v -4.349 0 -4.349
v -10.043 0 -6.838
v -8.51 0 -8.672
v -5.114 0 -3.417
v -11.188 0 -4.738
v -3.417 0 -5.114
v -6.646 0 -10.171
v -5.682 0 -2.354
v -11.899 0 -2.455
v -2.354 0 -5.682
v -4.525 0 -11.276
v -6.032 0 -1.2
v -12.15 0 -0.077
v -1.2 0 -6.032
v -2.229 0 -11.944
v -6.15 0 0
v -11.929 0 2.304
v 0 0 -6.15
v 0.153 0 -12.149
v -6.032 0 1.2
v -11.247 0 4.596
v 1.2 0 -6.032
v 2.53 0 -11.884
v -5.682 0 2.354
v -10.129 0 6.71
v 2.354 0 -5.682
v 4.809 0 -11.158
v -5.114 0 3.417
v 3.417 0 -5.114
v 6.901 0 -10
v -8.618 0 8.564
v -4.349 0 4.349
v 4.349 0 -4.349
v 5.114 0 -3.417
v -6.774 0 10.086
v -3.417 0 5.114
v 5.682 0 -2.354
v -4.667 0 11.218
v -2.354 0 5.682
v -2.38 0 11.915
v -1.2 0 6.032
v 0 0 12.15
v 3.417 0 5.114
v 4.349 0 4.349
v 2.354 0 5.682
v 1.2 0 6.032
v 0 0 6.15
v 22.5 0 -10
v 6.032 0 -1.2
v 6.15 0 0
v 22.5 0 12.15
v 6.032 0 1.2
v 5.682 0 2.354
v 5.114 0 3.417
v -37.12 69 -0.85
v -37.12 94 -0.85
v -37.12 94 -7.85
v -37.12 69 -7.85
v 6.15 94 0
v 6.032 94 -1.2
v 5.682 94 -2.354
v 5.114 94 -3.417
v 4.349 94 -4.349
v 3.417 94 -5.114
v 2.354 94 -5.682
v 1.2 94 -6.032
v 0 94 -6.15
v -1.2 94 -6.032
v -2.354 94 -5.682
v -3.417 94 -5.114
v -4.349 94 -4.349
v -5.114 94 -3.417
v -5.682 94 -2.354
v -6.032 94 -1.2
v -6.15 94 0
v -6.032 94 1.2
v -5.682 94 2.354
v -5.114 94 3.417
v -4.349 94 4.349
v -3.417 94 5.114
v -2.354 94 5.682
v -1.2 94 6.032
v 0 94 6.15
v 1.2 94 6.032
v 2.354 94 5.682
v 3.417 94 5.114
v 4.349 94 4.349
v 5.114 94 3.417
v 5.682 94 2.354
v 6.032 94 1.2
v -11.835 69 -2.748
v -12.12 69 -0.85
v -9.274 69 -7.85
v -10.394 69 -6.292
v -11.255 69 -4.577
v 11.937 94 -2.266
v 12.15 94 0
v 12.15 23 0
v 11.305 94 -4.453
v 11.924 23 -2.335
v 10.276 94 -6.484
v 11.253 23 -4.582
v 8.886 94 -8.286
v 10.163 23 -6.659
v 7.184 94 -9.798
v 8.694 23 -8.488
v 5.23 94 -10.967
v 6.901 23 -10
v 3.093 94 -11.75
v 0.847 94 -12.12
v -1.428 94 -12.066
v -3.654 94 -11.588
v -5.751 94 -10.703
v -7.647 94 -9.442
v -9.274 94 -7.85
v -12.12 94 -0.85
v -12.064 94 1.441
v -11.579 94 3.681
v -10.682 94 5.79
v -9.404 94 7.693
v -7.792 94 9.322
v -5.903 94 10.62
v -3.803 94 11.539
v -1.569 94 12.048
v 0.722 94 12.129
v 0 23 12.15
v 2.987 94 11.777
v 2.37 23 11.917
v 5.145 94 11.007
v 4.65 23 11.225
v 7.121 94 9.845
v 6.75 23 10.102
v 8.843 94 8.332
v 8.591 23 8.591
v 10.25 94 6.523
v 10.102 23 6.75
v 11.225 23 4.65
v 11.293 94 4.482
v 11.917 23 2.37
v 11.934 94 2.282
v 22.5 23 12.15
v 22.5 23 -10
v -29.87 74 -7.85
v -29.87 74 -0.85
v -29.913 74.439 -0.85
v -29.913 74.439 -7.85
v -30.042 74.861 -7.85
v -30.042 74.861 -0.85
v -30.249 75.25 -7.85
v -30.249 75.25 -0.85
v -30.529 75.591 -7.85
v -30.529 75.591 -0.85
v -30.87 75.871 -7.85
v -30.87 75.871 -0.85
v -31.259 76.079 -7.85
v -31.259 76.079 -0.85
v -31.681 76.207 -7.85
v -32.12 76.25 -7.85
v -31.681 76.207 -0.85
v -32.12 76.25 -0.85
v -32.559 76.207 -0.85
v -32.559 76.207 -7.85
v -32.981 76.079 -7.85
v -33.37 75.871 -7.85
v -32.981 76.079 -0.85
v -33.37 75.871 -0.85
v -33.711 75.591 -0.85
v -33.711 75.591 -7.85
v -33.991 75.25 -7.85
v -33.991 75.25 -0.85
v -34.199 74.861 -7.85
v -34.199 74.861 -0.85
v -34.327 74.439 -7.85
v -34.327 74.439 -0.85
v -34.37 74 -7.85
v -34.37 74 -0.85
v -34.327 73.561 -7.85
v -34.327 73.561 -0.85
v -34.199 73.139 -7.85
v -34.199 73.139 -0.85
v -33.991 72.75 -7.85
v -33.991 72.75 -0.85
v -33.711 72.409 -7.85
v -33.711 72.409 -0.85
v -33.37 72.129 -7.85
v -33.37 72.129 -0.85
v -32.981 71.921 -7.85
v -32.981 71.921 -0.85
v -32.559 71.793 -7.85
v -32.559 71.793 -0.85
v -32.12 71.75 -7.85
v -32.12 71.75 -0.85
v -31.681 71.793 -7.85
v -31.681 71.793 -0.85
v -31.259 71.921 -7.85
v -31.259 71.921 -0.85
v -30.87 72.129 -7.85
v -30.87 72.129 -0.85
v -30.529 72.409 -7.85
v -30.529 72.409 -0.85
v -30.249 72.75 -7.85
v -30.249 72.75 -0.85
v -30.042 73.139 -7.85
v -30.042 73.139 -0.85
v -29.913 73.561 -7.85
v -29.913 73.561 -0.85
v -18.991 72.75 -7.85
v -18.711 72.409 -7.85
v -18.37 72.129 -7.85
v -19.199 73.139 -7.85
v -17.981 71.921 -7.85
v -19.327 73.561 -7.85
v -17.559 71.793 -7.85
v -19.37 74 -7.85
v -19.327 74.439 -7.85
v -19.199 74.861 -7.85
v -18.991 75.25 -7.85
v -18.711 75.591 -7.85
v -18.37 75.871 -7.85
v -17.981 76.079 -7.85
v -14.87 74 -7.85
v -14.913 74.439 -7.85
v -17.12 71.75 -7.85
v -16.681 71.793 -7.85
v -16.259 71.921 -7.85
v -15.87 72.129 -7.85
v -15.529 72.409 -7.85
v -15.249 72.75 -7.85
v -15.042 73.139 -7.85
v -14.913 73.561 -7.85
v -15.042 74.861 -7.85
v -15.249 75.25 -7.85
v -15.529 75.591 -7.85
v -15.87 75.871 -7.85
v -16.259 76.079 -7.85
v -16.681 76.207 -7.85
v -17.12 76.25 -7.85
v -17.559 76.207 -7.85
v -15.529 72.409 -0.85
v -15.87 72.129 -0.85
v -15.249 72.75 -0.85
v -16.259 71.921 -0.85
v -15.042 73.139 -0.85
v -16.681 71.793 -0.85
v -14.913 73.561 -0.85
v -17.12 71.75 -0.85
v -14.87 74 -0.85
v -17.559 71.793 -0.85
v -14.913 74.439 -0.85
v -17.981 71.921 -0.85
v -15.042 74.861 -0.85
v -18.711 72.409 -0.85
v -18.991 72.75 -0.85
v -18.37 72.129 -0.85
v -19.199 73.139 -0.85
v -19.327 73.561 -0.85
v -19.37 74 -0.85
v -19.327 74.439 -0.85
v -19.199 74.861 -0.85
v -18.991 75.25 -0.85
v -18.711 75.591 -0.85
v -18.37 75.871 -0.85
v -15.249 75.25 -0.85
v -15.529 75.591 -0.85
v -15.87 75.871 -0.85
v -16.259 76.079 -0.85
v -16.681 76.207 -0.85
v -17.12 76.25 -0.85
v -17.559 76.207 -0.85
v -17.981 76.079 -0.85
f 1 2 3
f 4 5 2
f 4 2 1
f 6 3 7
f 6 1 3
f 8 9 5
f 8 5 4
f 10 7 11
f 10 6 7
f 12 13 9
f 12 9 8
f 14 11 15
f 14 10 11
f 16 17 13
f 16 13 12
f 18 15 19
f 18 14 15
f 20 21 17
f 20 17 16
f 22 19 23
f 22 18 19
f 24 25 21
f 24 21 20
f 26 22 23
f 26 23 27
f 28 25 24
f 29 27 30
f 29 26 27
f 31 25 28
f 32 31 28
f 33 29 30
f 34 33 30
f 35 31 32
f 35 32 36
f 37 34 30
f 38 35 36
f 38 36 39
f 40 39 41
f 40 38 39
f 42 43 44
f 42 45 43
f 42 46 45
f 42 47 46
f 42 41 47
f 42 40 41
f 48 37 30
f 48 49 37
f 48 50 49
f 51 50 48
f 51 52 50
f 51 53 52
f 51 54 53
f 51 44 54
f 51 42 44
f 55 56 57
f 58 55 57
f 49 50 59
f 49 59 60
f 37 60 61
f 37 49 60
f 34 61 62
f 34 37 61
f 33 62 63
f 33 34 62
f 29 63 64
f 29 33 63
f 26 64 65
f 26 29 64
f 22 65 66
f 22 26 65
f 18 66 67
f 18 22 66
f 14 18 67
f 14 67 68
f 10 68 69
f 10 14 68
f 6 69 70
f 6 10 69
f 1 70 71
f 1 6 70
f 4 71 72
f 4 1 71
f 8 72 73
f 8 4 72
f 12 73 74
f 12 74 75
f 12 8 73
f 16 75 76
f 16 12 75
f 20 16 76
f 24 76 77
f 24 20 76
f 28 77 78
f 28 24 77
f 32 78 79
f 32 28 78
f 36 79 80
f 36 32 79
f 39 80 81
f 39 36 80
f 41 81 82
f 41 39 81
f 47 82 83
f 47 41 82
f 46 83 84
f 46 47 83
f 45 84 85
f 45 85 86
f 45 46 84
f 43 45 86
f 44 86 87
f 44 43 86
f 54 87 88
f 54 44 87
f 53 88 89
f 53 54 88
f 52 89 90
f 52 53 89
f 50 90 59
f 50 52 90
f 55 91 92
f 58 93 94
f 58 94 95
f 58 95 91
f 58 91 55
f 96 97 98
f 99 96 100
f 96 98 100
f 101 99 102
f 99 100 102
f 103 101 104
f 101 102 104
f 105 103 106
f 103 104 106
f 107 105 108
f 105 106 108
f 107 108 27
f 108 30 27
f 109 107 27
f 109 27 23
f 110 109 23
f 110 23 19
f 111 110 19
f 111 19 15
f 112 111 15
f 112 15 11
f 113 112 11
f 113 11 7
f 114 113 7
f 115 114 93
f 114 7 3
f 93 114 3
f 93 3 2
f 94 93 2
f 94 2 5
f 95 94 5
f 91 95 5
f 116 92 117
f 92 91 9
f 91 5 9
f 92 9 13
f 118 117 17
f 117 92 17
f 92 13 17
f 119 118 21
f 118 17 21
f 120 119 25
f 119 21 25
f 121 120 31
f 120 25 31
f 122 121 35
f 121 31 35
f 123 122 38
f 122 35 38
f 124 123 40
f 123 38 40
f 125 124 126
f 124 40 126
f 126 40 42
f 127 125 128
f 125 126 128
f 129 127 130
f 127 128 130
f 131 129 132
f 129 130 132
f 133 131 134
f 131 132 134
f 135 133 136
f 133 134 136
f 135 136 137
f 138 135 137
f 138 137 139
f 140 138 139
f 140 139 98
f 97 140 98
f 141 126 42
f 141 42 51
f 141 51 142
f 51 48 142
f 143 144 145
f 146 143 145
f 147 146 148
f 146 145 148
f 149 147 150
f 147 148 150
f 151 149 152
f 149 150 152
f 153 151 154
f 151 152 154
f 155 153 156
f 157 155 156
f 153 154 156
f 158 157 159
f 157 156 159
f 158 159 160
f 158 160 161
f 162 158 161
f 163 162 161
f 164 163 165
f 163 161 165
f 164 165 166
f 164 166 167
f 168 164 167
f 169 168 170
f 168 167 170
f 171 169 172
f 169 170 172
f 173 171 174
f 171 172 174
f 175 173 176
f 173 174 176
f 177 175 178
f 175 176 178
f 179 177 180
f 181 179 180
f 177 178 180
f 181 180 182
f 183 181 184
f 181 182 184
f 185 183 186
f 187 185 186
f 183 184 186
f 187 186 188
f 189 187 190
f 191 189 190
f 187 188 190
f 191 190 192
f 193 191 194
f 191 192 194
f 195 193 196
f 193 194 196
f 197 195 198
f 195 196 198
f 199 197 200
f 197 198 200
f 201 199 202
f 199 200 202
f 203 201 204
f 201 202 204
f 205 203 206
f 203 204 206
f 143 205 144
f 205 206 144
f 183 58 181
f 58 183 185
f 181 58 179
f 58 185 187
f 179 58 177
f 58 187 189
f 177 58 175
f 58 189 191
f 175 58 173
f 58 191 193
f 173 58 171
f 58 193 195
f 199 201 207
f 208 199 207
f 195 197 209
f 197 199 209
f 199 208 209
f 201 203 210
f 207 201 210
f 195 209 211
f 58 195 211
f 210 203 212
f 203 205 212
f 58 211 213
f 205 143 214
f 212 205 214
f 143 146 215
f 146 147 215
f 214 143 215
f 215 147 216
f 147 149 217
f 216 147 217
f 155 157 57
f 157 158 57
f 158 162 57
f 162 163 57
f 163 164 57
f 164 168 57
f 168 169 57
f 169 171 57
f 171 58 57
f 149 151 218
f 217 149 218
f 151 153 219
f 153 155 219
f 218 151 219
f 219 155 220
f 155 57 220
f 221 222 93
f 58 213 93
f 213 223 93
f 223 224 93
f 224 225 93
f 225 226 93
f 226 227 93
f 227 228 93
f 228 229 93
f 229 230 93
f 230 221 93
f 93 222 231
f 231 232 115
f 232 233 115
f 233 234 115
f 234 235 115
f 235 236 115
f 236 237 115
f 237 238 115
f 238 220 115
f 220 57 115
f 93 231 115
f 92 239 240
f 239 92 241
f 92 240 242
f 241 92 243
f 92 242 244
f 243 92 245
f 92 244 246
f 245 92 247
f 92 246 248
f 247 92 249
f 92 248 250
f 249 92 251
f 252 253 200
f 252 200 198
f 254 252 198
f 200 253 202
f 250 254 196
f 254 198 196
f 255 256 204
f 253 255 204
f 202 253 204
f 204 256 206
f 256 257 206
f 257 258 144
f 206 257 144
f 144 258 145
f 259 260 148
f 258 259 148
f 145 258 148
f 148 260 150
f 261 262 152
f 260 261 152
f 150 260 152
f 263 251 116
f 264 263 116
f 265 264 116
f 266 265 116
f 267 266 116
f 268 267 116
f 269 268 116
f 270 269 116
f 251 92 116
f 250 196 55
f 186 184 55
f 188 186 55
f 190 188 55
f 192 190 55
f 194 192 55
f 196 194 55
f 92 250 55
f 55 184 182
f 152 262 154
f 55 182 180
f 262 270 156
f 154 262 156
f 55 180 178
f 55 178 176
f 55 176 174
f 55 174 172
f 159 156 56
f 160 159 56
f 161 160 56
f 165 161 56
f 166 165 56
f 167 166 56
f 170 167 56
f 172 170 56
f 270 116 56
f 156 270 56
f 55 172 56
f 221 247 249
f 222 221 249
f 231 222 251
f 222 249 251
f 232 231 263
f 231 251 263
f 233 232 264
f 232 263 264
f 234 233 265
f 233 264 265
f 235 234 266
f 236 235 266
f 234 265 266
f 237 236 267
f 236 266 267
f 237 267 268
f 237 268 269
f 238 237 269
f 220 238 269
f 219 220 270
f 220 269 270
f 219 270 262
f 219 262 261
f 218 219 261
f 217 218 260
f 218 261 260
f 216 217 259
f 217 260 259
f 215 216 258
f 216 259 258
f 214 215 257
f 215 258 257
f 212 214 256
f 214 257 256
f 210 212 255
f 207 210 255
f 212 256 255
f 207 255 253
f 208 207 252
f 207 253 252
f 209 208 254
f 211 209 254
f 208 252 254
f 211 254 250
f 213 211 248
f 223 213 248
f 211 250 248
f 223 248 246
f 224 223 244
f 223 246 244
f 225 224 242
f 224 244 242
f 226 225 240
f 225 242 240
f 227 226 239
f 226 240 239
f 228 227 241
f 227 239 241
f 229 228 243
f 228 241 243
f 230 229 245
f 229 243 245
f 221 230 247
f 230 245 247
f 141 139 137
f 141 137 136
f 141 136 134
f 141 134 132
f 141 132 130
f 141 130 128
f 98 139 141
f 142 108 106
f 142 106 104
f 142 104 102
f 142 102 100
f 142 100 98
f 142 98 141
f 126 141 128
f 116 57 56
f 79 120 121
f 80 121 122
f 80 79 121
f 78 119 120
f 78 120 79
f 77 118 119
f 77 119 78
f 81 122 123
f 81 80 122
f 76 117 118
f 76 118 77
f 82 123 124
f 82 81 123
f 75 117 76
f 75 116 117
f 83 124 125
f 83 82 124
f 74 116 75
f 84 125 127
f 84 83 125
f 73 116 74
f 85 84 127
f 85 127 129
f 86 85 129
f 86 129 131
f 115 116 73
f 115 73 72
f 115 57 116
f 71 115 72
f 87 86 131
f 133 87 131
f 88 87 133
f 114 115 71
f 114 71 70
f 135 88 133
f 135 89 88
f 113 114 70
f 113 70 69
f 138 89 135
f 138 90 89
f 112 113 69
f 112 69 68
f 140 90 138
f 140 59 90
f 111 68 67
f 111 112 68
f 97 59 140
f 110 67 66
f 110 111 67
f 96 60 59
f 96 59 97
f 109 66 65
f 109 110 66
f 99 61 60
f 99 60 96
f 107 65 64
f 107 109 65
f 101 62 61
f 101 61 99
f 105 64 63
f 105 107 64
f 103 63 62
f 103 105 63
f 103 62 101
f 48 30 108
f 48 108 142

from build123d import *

# Parameters (mm, degrees)
SKETCH1_R                = 12.15
SKETCH1_R_2              = 6.15
EXTRUDE_THIN1_DEPTH      = 94
LIMIT_SWITCH_MOUNT_DEPTH = 25
SKETCH3_R                = 2.25
HEAT_SET_INSERTS_DEPTH   = 7
SKETCH4_W                = 22.5
SKETCH4_H                = 23
BOSS_EXTRUDE1_DEPTH      = 12.15
BOSS_EXTRUDE1_DEPTH_BACK = 10
SKETCH1_3_R              = 6.15
CUT_EXTRUDE1_DEPTH       = 94


with BuildPart() as part:
    # Sketch1 → Extrude-Thin1 (new body)
    with BuildSketch(Plane(origin=(0, 0, 0), x_dir=(1, 0, 0), z_dir=(0, 1, 0))):
        Circle(SKETCH1_R)
        Circle(SKETCH1_R_2, mode=Mode.SUBTRACT)
    extrude(amount=EXTRUDE_THIN1_DEPTH)

    # Sketch2 → limit switch mount (add)
    with BuildSketch(Plane(origin=(0, 94, 0), x_dir=(1, 0, 0), z_dir=(0, 1, 0))):
        with BuildLine():
            Line((-12.120231021, 0.85), (-37.120231021, 0.85))
            Line((-37.120231021, 0.85), (-37.120231021, 7.85))
            Line((-37.120231021, 7.85), (-9.273618495, 7.85))
            ThreePointArc((-9.273618495, 7.85), (-11.254963318, 4.576931365), (-12.120231021, 0.85))
        make_face()
    extrude(amount=-LIMIT_SWITCH_MOUNT_DEPTH)

    # Sketch3 → heat set inserts (cut)
    with BuildSketch(Plane.XY.offset(-0.85)):
        with Locations((-17.120231021, 74)):
            Circle(SKETCH3_R)
        with Locations((-32.120231021, 74)):
            Circle(SKETCH3_R)
    extrude(amount=-HEAT_SET_INSERTS_DEPTH, mode=Mode.SUBTRACT)

    # Sketch4 → Boss-Extrude1 (add, two sides)
    with BuildSketch(Plane.XY) as boss_extrude1_sk:
        with Locations((11.25, 11.5)):
            Rectangle(SKETCH4_W, SKETCH4_H)
    extrude(amount=BOSS_EXTRUDE1_DEPTH)
    extrude(boss_extrude1_sk.sketch, amount=-BOSS_EXTRUDE1_DEPTH_BACK)

    # Sketch1<3> → Cut-Extrude1 (cut)
    with BuildSketch(Plane(origin=(0, 0, 0), x_dir=(1, 0, 0), z_dir=(0, 1, 0))):
        Circle(SKETCH1_3_R)
    extrude(amount=CUT_EXTRUDE1_DEPTH, mode=Mode.SUBTRACT)


solid = part.part
